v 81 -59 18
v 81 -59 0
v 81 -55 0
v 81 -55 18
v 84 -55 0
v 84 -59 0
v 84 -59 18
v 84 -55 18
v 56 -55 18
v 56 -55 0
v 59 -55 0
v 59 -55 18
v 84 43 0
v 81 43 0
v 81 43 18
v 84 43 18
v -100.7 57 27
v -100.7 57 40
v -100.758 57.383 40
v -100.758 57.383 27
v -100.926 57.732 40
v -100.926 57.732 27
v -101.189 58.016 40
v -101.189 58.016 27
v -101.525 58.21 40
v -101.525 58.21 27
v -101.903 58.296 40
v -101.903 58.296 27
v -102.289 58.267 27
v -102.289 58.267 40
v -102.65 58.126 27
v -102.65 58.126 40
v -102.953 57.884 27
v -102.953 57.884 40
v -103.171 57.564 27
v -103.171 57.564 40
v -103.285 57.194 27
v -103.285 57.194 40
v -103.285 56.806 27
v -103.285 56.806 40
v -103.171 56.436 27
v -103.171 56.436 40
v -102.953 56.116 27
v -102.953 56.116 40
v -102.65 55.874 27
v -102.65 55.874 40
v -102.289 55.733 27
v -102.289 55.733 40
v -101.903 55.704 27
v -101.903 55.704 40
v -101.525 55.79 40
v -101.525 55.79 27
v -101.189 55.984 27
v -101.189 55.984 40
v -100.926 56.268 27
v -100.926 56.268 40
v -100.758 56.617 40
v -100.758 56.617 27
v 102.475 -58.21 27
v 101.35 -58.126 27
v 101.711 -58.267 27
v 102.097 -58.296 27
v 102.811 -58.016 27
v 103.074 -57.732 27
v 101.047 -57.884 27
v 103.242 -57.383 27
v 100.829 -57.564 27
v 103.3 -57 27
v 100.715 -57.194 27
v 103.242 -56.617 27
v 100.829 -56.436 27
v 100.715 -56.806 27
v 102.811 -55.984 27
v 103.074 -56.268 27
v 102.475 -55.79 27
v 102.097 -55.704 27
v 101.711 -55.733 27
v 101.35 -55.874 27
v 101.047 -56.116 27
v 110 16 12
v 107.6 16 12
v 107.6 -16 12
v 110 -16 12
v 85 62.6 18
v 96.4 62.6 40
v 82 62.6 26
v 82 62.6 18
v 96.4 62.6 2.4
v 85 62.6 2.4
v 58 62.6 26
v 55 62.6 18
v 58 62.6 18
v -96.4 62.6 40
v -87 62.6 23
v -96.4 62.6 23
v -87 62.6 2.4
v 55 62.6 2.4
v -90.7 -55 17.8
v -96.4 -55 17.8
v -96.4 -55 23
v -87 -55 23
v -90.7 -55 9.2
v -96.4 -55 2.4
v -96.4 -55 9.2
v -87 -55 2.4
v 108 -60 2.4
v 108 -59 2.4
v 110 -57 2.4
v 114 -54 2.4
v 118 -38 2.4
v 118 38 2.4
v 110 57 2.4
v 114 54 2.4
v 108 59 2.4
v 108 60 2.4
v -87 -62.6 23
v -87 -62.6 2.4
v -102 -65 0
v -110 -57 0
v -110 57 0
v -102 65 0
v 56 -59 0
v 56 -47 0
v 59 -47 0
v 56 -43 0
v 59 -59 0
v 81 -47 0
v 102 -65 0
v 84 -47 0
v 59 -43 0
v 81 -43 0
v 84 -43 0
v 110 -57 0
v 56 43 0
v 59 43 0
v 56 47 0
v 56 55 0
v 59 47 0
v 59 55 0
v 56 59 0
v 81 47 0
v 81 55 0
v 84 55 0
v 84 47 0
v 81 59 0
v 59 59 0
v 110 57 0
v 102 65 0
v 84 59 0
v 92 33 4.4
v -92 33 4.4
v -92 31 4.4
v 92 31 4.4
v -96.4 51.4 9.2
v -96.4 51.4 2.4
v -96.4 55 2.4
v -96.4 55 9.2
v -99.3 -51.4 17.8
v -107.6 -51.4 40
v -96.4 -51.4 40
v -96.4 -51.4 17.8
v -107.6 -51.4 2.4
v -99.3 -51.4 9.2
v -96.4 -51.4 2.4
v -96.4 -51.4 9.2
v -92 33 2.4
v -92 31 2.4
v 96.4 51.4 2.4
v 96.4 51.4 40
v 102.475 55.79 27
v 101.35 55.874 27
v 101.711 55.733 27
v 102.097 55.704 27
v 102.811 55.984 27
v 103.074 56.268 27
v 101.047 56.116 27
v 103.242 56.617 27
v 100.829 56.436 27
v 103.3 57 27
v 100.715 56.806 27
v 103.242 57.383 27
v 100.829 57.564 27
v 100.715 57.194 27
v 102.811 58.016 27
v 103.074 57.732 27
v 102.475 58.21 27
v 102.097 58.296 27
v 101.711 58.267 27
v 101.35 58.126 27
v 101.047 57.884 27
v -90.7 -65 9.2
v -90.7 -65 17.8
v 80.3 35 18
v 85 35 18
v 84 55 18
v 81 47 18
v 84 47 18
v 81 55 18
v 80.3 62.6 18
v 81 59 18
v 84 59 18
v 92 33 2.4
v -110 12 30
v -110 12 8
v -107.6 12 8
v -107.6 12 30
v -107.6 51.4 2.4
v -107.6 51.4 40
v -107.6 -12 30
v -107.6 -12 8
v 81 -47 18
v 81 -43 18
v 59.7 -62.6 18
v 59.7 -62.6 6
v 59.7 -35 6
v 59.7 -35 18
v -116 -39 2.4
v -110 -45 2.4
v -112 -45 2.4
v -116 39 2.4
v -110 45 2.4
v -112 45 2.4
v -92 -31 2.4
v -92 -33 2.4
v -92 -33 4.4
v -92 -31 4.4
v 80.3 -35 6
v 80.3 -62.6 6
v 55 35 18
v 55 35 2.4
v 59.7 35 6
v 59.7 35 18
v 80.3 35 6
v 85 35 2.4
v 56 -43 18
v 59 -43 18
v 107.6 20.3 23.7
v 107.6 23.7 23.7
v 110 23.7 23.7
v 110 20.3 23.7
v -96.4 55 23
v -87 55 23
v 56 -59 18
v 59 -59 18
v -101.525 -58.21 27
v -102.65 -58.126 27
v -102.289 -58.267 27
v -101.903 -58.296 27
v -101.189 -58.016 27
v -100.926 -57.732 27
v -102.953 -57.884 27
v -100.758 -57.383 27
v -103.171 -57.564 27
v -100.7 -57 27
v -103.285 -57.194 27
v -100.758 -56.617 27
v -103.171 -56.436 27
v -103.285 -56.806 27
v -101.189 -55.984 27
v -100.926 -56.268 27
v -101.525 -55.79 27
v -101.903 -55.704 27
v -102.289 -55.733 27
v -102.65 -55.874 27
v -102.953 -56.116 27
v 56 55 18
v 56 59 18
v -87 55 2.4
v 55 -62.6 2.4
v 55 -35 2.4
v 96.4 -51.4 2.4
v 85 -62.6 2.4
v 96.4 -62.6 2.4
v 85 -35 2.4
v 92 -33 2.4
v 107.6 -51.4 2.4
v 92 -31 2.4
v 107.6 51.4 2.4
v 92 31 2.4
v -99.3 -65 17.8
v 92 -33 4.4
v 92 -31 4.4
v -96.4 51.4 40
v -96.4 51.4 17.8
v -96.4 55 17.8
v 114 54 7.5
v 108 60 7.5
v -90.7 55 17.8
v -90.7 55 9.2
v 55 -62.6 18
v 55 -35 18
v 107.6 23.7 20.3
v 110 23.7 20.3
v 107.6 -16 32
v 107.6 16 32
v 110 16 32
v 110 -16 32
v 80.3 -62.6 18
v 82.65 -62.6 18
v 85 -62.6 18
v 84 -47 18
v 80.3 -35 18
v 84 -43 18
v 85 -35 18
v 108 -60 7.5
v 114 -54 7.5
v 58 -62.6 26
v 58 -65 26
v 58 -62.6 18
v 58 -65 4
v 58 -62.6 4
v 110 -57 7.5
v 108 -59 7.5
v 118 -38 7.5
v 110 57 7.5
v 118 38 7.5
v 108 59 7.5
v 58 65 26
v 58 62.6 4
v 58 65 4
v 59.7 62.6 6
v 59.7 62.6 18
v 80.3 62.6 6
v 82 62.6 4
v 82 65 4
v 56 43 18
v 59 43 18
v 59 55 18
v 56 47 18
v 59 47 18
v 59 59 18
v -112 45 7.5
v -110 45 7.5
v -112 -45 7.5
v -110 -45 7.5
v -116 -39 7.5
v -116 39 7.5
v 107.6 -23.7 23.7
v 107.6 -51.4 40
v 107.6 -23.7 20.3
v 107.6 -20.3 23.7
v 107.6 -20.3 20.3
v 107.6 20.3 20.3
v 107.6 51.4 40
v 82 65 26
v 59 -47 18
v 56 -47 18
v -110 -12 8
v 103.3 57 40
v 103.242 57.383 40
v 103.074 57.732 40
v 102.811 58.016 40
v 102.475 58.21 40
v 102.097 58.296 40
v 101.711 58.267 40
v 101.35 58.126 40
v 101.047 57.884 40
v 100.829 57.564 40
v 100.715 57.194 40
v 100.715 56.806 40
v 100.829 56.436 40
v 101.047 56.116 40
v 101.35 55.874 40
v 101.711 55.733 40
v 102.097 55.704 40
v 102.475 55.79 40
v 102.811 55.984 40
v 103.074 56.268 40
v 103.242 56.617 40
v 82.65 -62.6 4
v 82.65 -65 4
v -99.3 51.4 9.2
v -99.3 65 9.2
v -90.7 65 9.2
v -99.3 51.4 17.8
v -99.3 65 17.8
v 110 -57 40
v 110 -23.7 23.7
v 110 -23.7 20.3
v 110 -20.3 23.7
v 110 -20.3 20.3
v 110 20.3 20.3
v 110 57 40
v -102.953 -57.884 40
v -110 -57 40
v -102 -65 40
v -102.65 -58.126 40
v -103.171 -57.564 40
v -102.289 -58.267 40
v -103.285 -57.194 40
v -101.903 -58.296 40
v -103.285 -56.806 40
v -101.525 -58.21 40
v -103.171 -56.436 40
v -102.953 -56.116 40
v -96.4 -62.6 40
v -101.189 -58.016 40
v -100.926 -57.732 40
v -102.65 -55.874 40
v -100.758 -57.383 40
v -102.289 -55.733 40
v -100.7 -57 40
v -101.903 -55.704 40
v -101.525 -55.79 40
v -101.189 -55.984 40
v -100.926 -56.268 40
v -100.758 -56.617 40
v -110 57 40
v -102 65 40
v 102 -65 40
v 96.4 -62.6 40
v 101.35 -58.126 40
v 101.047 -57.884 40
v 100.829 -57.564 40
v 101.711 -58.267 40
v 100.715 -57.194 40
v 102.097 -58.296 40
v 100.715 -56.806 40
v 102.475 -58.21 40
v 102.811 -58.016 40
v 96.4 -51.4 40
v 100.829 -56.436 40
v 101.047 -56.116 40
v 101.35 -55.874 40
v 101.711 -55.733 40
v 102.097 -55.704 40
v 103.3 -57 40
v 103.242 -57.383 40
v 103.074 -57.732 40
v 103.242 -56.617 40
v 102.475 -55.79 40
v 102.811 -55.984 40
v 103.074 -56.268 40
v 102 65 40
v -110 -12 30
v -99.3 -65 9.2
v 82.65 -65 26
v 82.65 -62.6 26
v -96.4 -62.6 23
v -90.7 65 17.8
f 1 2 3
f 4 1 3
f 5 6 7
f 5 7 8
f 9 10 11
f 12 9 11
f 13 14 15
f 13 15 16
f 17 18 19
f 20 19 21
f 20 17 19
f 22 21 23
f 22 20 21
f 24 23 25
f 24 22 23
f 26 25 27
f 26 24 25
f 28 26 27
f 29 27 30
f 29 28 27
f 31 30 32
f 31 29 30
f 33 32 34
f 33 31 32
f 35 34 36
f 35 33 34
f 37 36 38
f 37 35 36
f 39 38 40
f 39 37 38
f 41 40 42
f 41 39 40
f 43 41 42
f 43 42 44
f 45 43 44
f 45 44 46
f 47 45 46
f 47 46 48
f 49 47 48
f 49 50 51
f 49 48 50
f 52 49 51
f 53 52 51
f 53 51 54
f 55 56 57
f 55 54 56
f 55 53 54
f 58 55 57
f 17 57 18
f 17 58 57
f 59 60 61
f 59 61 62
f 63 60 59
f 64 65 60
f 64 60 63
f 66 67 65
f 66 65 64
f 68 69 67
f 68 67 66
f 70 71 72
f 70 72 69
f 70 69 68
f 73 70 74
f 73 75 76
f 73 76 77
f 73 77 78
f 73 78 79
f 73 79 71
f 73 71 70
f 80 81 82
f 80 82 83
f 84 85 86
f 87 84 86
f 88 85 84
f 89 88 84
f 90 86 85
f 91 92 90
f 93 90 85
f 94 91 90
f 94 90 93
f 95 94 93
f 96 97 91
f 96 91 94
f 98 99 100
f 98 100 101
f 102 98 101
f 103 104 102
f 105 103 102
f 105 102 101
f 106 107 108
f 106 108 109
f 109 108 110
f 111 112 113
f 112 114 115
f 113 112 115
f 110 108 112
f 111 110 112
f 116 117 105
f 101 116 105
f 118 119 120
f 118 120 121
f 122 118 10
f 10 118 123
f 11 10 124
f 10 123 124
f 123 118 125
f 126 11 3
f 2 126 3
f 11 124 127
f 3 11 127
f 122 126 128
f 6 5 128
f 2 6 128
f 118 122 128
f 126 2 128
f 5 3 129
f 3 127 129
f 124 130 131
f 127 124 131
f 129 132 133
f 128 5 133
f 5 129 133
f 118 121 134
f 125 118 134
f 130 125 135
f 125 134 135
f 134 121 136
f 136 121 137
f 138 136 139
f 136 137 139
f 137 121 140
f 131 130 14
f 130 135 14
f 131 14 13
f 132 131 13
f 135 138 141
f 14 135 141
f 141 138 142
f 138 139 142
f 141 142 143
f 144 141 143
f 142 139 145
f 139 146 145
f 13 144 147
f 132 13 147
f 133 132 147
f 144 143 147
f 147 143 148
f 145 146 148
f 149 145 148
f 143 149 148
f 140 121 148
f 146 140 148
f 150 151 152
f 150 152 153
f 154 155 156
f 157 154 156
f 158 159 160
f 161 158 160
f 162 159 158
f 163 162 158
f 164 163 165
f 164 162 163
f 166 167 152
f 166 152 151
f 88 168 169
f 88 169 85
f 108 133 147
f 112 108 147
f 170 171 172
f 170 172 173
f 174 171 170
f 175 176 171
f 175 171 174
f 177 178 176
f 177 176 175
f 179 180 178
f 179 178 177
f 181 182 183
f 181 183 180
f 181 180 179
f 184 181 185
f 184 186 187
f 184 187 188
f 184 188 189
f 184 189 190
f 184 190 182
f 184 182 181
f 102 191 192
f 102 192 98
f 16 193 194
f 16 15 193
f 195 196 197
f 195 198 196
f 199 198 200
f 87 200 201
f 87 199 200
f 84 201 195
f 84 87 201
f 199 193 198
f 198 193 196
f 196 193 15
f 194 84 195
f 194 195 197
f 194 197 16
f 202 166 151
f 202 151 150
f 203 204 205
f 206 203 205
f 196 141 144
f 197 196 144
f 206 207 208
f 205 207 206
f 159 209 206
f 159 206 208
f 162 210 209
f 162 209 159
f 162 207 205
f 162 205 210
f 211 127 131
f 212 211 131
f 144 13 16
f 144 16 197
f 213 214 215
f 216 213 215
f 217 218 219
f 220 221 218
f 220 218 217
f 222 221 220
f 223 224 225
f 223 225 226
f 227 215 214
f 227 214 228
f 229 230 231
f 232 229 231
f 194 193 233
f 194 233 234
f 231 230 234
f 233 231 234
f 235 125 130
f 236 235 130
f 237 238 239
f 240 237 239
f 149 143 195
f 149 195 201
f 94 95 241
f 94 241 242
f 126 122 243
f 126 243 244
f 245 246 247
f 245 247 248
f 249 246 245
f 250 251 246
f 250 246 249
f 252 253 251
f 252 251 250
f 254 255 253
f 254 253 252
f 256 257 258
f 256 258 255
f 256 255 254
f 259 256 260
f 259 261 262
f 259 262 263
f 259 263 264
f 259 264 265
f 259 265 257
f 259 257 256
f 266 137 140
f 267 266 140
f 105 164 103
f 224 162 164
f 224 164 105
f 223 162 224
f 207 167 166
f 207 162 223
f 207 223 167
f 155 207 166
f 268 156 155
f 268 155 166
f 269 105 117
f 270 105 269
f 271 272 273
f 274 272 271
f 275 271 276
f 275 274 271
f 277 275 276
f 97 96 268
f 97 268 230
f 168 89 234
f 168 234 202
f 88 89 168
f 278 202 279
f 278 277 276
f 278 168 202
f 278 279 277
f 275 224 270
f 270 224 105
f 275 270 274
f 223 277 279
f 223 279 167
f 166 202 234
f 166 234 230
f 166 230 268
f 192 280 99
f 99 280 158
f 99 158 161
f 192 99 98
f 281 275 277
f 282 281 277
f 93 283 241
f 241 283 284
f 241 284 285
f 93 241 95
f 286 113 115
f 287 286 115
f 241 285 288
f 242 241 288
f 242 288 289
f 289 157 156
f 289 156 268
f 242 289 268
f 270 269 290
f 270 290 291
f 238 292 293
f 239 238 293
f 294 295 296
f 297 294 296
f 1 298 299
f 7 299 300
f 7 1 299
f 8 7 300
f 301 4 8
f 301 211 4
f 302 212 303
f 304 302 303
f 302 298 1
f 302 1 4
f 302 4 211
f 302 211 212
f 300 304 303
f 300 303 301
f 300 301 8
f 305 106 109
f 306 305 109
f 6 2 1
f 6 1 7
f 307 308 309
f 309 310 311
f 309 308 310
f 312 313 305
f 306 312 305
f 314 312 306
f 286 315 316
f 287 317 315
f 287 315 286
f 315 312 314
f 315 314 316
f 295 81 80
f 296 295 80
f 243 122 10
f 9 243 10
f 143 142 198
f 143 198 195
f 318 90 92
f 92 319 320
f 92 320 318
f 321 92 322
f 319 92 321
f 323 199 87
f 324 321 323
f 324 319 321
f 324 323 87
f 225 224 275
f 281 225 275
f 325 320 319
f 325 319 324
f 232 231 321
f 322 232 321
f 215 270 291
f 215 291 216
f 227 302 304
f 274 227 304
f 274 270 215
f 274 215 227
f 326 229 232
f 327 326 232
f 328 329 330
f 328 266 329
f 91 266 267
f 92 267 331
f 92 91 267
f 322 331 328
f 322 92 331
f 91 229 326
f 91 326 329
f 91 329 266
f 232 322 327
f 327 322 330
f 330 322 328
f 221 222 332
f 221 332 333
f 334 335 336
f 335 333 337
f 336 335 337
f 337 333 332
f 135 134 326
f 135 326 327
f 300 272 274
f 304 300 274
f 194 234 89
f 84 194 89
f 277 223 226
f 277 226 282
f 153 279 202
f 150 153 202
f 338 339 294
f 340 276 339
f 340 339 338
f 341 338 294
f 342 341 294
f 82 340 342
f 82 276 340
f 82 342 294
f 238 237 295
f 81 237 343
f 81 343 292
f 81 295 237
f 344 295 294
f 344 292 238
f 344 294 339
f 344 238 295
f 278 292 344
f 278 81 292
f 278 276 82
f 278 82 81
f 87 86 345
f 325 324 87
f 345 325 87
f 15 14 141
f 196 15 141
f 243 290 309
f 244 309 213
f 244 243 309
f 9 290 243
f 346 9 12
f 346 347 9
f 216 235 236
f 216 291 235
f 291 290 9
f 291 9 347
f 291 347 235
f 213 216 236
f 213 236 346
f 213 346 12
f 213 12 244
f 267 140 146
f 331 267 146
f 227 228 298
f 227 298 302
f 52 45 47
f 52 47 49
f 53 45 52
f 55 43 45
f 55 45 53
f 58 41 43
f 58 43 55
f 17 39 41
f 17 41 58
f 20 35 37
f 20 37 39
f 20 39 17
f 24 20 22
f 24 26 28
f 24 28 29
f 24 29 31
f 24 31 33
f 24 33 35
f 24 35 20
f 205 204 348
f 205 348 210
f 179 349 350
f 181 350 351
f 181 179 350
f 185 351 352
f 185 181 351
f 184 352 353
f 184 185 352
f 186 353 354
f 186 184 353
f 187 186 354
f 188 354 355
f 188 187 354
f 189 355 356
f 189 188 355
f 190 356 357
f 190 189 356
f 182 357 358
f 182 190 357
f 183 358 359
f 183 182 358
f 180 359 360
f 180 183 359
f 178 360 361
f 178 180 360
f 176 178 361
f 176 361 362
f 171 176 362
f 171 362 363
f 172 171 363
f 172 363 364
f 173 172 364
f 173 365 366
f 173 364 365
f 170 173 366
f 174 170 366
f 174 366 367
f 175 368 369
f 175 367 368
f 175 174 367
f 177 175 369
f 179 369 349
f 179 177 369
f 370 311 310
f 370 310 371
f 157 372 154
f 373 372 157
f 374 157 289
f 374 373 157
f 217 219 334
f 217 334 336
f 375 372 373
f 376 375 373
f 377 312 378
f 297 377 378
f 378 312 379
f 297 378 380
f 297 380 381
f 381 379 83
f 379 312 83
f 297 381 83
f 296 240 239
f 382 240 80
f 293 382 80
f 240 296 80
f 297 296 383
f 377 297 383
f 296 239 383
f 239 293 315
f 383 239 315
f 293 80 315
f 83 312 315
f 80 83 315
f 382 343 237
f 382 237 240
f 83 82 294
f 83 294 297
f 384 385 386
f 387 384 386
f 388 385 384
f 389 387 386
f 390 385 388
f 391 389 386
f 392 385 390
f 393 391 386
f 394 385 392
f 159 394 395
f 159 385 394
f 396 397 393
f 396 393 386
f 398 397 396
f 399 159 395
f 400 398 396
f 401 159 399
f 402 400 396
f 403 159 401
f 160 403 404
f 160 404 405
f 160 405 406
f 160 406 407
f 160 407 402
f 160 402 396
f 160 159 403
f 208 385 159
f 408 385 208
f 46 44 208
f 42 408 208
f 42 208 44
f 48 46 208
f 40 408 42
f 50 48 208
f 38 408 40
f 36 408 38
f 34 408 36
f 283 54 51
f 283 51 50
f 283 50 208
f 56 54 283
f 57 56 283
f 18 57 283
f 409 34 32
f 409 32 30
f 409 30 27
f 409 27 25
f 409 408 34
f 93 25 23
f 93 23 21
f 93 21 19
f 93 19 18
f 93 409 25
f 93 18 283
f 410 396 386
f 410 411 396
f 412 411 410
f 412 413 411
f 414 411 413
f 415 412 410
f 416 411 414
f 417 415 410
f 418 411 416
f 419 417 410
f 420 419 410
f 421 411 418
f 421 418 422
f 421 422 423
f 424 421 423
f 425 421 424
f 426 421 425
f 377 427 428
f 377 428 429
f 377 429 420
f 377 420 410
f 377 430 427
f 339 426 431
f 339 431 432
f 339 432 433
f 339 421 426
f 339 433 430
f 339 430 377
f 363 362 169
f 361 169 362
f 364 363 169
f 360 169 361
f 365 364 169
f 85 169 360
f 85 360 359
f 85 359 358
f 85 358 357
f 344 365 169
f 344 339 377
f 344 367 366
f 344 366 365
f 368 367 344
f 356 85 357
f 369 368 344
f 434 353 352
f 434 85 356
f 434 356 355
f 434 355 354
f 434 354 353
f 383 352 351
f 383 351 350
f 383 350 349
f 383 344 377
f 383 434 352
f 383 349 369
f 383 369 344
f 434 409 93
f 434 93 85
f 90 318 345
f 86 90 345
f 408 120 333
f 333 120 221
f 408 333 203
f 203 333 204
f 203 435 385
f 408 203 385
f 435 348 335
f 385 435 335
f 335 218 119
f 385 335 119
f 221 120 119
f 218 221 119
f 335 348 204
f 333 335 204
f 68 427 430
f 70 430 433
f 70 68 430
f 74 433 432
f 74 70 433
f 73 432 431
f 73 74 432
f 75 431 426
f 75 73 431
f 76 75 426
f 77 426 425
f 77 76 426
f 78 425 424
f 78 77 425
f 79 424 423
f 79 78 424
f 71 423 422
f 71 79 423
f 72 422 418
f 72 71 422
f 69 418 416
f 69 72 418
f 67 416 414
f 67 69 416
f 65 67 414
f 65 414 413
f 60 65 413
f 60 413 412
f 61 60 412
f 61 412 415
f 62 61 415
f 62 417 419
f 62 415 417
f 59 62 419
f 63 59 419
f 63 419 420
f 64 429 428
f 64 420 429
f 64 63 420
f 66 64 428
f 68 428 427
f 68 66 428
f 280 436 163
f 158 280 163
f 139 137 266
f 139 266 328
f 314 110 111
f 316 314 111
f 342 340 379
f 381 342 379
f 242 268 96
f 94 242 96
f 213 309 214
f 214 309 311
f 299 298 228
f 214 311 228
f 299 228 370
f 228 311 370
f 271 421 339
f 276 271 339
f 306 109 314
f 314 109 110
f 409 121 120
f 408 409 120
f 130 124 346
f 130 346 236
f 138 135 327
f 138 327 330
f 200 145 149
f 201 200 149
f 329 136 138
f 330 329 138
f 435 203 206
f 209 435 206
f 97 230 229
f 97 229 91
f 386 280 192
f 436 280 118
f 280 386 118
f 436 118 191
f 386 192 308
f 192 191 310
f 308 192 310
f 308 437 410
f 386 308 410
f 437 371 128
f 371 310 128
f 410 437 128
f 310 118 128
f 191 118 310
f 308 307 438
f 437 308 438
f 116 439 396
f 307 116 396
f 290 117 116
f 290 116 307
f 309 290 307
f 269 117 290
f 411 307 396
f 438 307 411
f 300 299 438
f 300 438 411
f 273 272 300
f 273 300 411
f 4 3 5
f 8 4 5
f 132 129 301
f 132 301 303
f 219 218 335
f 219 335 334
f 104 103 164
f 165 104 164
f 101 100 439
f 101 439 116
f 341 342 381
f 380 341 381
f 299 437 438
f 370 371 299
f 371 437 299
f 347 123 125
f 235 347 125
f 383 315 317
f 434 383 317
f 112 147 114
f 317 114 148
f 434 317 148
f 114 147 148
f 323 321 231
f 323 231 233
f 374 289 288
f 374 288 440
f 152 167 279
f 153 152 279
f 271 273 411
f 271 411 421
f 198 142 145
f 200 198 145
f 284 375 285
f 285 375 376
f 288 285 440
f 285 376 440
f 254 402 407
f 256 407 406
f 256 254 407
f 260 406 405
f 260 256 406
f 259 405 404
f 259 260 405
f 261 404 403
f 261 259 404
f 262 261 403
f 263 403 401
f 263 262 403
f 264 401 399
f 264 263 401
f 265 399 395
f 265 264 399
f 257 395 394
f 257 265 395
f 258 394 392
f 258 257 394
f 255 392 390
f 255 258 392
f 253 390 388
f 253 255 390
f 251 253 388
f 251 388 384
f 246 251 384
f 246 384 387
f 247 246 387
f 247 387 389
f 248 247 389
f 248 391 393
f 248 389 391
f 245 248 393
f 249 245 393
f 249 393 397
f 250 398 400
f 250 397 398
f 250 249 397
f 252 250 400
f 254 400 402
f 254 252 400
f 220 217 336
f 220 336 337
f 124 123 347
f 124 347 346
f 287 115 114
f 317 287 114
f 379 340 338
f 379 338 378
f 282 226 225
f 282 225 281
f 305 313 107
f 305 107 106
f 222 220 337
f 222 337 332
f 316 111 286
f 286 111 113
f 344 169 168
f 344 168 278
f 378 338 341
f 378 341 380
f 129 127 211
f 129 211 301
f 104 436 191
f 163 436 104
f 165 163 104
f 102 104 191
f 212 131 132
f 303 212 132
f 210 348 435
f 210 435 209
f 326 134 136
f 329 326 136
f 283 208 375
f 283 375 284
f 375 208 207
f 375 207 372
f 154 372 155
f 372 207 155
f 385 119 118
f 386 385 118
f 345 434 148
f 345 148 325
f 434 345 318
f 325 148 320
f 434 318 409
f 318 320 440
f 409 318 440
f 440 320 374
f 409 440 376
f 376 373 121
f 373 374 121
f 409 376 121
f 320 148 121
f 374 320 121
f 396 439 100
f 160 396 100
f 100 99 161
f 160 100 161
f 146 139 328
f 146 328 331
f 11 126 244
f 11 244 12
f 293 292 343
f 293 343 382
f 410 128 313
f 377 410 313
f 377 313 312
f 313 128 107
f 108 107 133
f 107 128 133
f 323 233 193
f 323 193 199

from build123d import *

# Parameters (mm, degrees)
FACETED_FLOOR_220X130_DEPTH             = 2.4
FACETED_HOLLOW_WALLS_2P4_START          = 2.4
FACETED_HOLLOW_WALLS_2P4_DEPTH          = 37.6
LID_POST_1_1_START                      = 2.4
SKETCH3_W                               = 11.2
SKETCH3_H                               = 11.2
LID_POST_1_1_DEPTH                      = 37.6
M3_PILOT_1_1_START                      = 27
SKETCH4_R                               = 1.3
M3_PILOT_1_1_DEPTH                      = 14
SKETCH5_W                               = 11.2
SKETCH5_H                               = 11.2
LID_POST_1_1_2_DEPTH                    = 37.6
SKETCH6_R                               = 1.3
M3_PILOT_1_1_2_DEPTH                    = 14
SKETCH7_W                               = 11.2
SKETCH7_H                               = 11.2
LID_POST_1_1_3_DEPTH                    = 37.6
SKETCH8_R                               = 1.3
M3_PILOT_1_1_3_DEPTH                    = 14
SKETCH9_W                               = 11.2
SKETCH9_H                               = 11.2
LID_POST_1_1_4_DEPTH                    = 37.6
SKETCH10_R                              = 1.3
M3_PILOT_1_1_4_DEPTH                    = 14
MOTOR_SADDLE_BASE_1_START               = 2.4
SKETCH11_W                              = 30
SKETCH11_H                              = 30
MOTOR_SADDLE_BASE_1_DEPTH               = 3.6
MOTOR_GUIDE_A_1_START                   = 6
SKETCH12_W                              = 4.7
SKETCH12_H                              = 30
MOTOR_GUIDE_A_1_DEPTH                   = 12
MOTOR_GUIDE_B_1_START                   = 6
SKETCH13_W                              = 4.7
SKETCH13_H                              = 30
MOTOR_GUIDE_B_1_DEPTH                   = 12
TIESLOT_1_56_43_START                   = -0.1
SKETCH14_W                              = 3
SKETCH14_H                              = 4
TIESLOT_1_56_43_DEPTH                   = 19
TIESLOT_1_81_43_START                   = -0.1
SKETCH15_W                              = 3
SKETCH15_H                              = 4
TIESLOT_1_81_43_DEPTH                   = 19
TIESLOT_1_56_55_START                   = -0.1
SKETCH16_W                              = 3
SKETCH16_H                              = 4
TIESLOT_1_56_55_DEPTH                   = 19
TIESLOT_1_81_55_START                   = -0.1
SKETCH17_W                              = 3
SKETCH17_H                              = 4
TIESLOT_1_81_55_DEPTH                   = 19
MOTOR_SIDE_WINDOW_1_START               = 4
SKETCH18_W                              = 24.65
SKETCH18_H                              = 3.4
MOTOR_SIDE_WINDOW_1_DEPTH               = 22
REAR_AXLE_SUPPORT_1_START               = 2.4
SKETCH19_W                              = 16
SKETCH19_H                              = 10
REAR_AXLE_SUPPORT_1_DEPTH               = 20.6
REAR_PRINTED_AXLE_CLEARANCE_8P6_1_START = 9.2
SKETCH20_W                              = 8.6
SKETCH20_H                              = 15
REAR_PRINTED_AXLE_CLEARANCE_8P6_1_DEPTH = 8.6
SKETCH21_W                              = 30
SKETCH21_H                              = 30
MOTOR_SADDLE_BASE_1_2_DEPTH             = 3.6
SKETCH22_W                              = 4.7
SKETCH22_H                              = 30
MOTOR_GUIDE_A_1_2_DEPTH                 = 12
SKETCH23_W                              = 4.7
SKETCH23_H                              = 30
MOTOR_GUIDE_B_1_2_DEPTH                 = 12
SKETCH24_W                              = 3
SKETCH24_H                              = 4
TIESLOT_1_56_43_2_DEPTH                 = 19
SKETCH25_W                              = 3
SKETCH25_H                              = 4
TIESLOT_1_81_43_2_DEPTH                 = 19
SKETCH26_W                              = 3
SKETCH26_H                              = 4
TIESLOT_1_56_55_2_DEPTH                 = 19
SKETCH27_W                              = 3
SKETCH27_H                              = 4
TIESLOT_1_81_55_2_DEPTH                 = 19
SKETCH28_W                              = 24
SKETCH28_H                              = 3.4
MOTOR_SIDE_WINDOW_1_2_DEPTH             = 22
SKETCH29_W                              = 16
SKETCH29_H                              = 10
REAR_AXLE_SUPPORT_1_2_DEPTH             = 20.6
REAR_PRINTED_AXLE_CLEARANCE_8P61_START  = 9.2
SKETCH30_W                              = 8.6
SKETCH30_H                              = 14.6
REAR_PRINTED_AXLE_CLEARANCE_8P61_DEPTH  = 8.6
REAR_USB_ACCESS_24X22_START             = 8
SKETCH31_W                              = 3.4
SKETCH31_H                              = 24
REAR_USB_ACCESS_24X22_DEPTH             = 22
FRONT_TOF_WINDOW_32X20_START            = 12
SKETCH32_W                              = 3.4
SKETCH32_H                              = 32
FRONT_TOF_WINDOW_32X20_DEPTH            = 20
TOF_M3_CLEARANCE_1_START                = 20.3
SKETCH33_W                              = 3.4
SKETCH33_H                              = 3.4
TOF_M3_CLEARANCE_1_DEPTH                = 3.4
SKETCH34_W                              = 3.4
SKETCH34_H                              = 3.4
TOF_M3_CLEARANCE_1_2_DEPTH              = 3.4
BREADBOARD_LEFT_GUIDE_START             = 2.4
SKETCH35_W                              = 184
SKETCH35_H                              = 2
BREADBOARD_LEFT_GUIDE_DEPTH             = 2
BREADBOARD_RIGHT_GUIDE_START            = 2.4
SKETCH36_W                              = 184
SKETCH36_H                              = 2
BREADBOARD_RIGHT_GUIDE_DEPTH            = 2
OUTER_CORNER_TRIM_1_1_START             = 0.1
OUTER_CORNER_TRIM_1_1_DEPTH             = 40.2
OUTER_CORNER_TRIM_1_1_2_DEPTH           = 40.2
OUTER_CORNER_TRIM_1_1_3_DEPTH           = 40.2
OUTER_CORNER_TRIM_1_1_4_DEPTH           = 40.2
ANGLED_FRONT_BUMPER_START               = 2.4
ANGLED_FRONT_BUMPER_DEPTH               = 5.1
ANGLED_REAR_BUMPER_START                = 2.4
ANGLED_REAR_BUMPER_DEPTH                = 5.1


with BuildPart() as part:
    # Sketch1 → Faceted_Floor_220x130 (new body)
    with BuildSketch(Plane.XY):
        Polygon((-102, -65), (102, -65), (110, -57), (110, 57), (102, 65), (-102, 65), (-110, 57), (-110, -57), align=None)
    extrude(amount=FACETED_FLOOR_220X130_DEPTH)

    # Sketch2 → Faceted_Hollow_Walls_2p4 (add)
    with BuildSketch(Plane.XY.offset(FACETED_HOLLOW_WALLS_2P4_START)):
        Polygon((-102, -65), (102, -65), (110, -57), (110, 57), (102, 65), (-102, 65), (-110, 57), (-110, -57), align=None)
        Polygon((-102, -62.6), (102, -62.6), (107.6, -57), (107.6, 57), (102, 62.6), (-102, 62.6), (-107.6, 57), (-107.6, -57), align=None, mode=Mode.SUBTRACT)
    extrude(amount=FACETED_HOLLOW_WALLS_2P4_DEPTH)

    # Sketch3 → Lid_Post_-1_-1 (add)
    with BuildSketch(Plane.XY.offset(LID_POST_1_1_START)):
        with Locations((-102, -57)):
            Rectangle(SKETCH3_W, SKETCH3_H)
    extrude(amount=LID_POST_1_1_DEPTH)

    # Sketch4 → M3_Pilot_-1_-1 (cut)
    with BuildSketch(Plane.XY.offset(M3_PILOT_1_1_START)):
        with Locations((-102, -57)):
            Circle(SKETCH4_R)
    extrude(amount=M3_PILOT_1_1_DEPTH, mode=Mode.SUBTRACT)

    # Sketch5 → Lid_Post_-1_1 2 (add)
    with BuildSketch(Plane.XY.offset(LID_POST_1_1_START)):
        with Locations((-102, 57)):
            Rectangle(SKETCH5_W, SKETCH5_H)
    extrude(amount=LID_POST_1_1_2_DEPTH)

    # Sketch6 → M3_Pilot_-1_1 2 (cut)
    with BuildSketch(Plane.XY.offset(M3_PILOT_1_1_START)):
        with Locations((-102, 57)):
            Circle(SKETCH6_R)
    extrude(amount=M3_PILOT_1_1_2_DEPTH, mode=Mode.SUBTRACT)

    # Sketch7 → Lid_Post_1_-1 3 (add)
    with BuildSketch(Plane.XY.offset(LID_POST_1_1_START)):
        with Locations((102, -57)):
            Rectangle(SKETCH7_W, SKETCH7_H)
    extrude(amount=LID_POST_1_1_3_DEPTH)

    # Sketch8 → M3_Pilot_1_-1 3 (cut)
    with BuildSketch(Plane.XY.offset(M3_PILOT_1_1_START)):
        with Locations((102, -57)):
            Circle(SKETCH8_R)
    extrude(amount=M3_PILOT_1_1_3_DEPTH, mode=Mode.SUBTRACT)

    # Sketch9 → Lid_Post_1_1 4 (add)
    with BuildSketch(Plane.XY.offset(LID_POST_1_1_START)):
        with Locations((102, 57)):
            Rectangle(SKETCH9_W, SKETCH9_H)
    extrude(amount=LID_POST_1_1_4_DEPTH)

    # Sketch10 → M3_Pilot_1_1 4 (cut)
    with BuildSketch(Plane.XY.offset(M3_PILOT_1_1_START)):
        with Locations((102, 57)):
            Circle(SKETCH10_R)
    extrude(amount=M3_PILOT_1_1_4_DEPTH, mode=Mode.SUBTRACT)

    # Sketch11 → Motor_Saddle_Base_-1 (add)
    with BuildSketch(Plane.XY.offset(MOTOR_SADDLE_BASE_1_START)):
        with Locations((70, -50)):
            Rectangle(SKETCH11_W, SKETCH11_H)
    extrude(amount=MOTOR_SADDLE_BASE_1_DEPTH)

    # Sketch12 → Motor_Guide_A_-1 (add)
    with BuildSketch(Plane.XY.offset(MOTOR_GUIDE_A_1_START)):
        with Locations((57.35, -50)):
            Rectangle(SKETCH12_W, SKETCH12_H)
    extrude(amount=MOTOR_GUIDE_A_1_DEPTH)

    # Sketch13 → Motor_Guide_B_-1 (add)
    with BuildSketch(Plane.XY.offset(MOTOR_GUIDE_B_1_START)):
        with Locations((82.65, -50)):
            Rectangle(SKETCH13_W, SKETCH13_H)
    extrude(amount=MOTOR_GUIDE_B_1_DEPTH)

    # Sketch14 → TieSlot_-1_56_43 (cut)
    with BuildSketch(Plane.XY.offset(TIESLOT_1_56_43_START)):
        with Locations((57.5, -45)):
            Rectangle(SKETCH14_W, SKETCH14_H)
    extrude(amount=TIESLOT_1_56_43_DEPTH, mode=Mode.SUBTRACT)

    # Sketch15 → TieSlot_-1_81_43 (cut)
    with BuildSketch(Plane.XY.offset(TIESLOT_1_81_43_START)):
        with Locations((82.5, -45)):
            Rectangle(SKETCH15_W, SKETCH15_H)
    extrude(amount=TIESLOT_1_81_43_DEPTH, mode=Mode.SUBTRACT)

    # Sketch16 → TieSlot_-1_56_55 (cut)
    with BuildSketch(Plane.XY.offset(TIESLOT_1_56_55_START)):
        with Locations((57.5, -57)):
            Rectangle(SKETCH16_W, SKETCH16_H)
    extrude(amount=TIESLOT_1_56_55_DEPTH, mode=Mode.SUBTRACT)

    # Sketch17 → TieSlot_-1_81_55 (cut)
    with BuildSketch(Plane.XY.offset(TIESLOT_1_81_55_START)):
        with Locations((82.5, -57)):
            Rectangle(SKETCH17_W, SKETCH17_H)
    extrude(amount=TIESLOT_1_81_55_DEPTH, mode=Mode.SUBTRACT)

    # Sketch18 → Motor_Side_Window_-1 (cut)
    with BuildSketch(Plane.XY.offset(MOTOR_SIDE_WINDOW_1_START)):
        with Locations((70.325, -64.3)):
            Rectangle(SKETCH18_W, SKETCH18_H)
    extrude(amount=MOTOR_SIDE_WINDOW_1_DEPTH, mode=Mode.SUBTRACT)

    # Sketch19 → Rear_Axle_Support_-1 (add)
    with BuildSketch(Plane.XY.offset(REAR_AXLE_SUPPORT_1_START)):
        with Locations((-95, -60)):
            Rectangle(SKETCH19_W, SKETCH19_H)
    extrude(amount=REAR_AXLE_SUPPORT_1_DEPTH)

    # Sketch20 → Rear_Printed_Axle_Clearance_8p6-1 (cut)
    with BuildSketch(Plane.XY.offset(REAR_PRINTED_AXLE_CLEARANCE_8P6_1_START)):
        with Locations((-95, -58.5)):
            Rectangle(SKETCH20_W, SKETCH20_H)
    extrude(amount=REAR_PRINTED_AXLE_CLEARANCE_8P6_1_DEPTH, mode=Mode.SUBTRACT)

    # Sketch21 → Motor_Saddle_Base_1 2 (add)
    with BuildSketch(Plane.XY.offset(MOTOR_SADDLE_BASE_1_START)):
        with Locations((70, 50)):
            Rectangle(SKETCH21_W, SKETCH21_H)
    extrude(amount=MOTOR_SADDLE_BASE_1_2_DEPTH)

    # Sketch22 → Motor_Guide_A_1 2 (add)
    with BuildSketch(Plane.XY.offset(MOTOR_GUIDE_A_1_START)):
        with Locations((57.35, 50)):
            Rectangle(SKETCH22_W, SKETCH22_H)
    extrude(amount=MOTOR_GUIDE_A_1_2_DEPTH)

    # Sketch23 → Motor_Guide_B_1 2 (add)
    with BuildSketch(Plane.XY.offset(MOTOR_GUIDE_B_1_START)):
        with Locations((82.65, 50)):
            Rectangle(SKETCH23_W, SKETCH23_H)
    extrude(amount=MOTOR_GUIDE_B_1_2_DEPTH)

    # Sketch24 → TieSlot_1_56_43 2 (cut)
    with BuildSketch(Plane.XY.offset(TIESLOT_1_56_43_START)):
        with Locations((57.5, 45)):
            Rectangle(SKETCH24_W, SKETCH24_H)
    extrude(amount=TIESLOT_1_56_43_2_DEPTH, mode=Mode.SUBTRACT)

    # Sketch25 → TieSlot_1_81_43 2 (cut)
    with BuildSketch(Plane.XY.offset(TIESLOT_1_81_43_START)):
        with Locations((82.5, 45)):
            Rectangle(SKETCH25_W, SKETCH25_H)
    extrude(amount=TIESLOT_1_81_43_2_DEPTH, mode=Mode.SUBTRACT)

    # Sketch26 → TieSlot_1_56_55 2 (cut)
    with BuildSketch(Plane.XY.offset(TIESLOT_1_56_55_START)):
        with Locations((57.5, 57)):
            Rectangle(SKETCH26_W, SKETCH26_H)
    extrude(amount=TIESLOT_1_56_55_2_DEPTH, mode=Mode.SUBTRACT)

    # Sketch27 → TieSlot_1_81_55 2 (cut)
    with BuildSketch(Plane.XY.offset(TIESLOT_1_81_55_START)):
        with Locations((82.5, 57)):
            Rectangle(SKETCH27_W, SKETCH27_H)
    extrude(amount=TIESLOT_1_81_55_2_DEPTH, mode=Mode.SUBTRACT)

    # Sketch28 → Motor_Side_Window_1 2 (cut)
    with BuildSketch(Plane.XY.offset(MOTOR_SIDE_WINDOW_1_START)):
        with Locations((70, 64.3)):
            Rectangle(SKETCH28_W, SKETCH28_H)
    extrude(amount=MOTOR_SIDE_WINDOW_1_2_DEPTH, mode=Mode.SUBTRACT)

    # Sketch29 → Rear_Axle_Support_1 2 (add)
    with BuildSketch(Plane.XY.offset(REAR_AXLE_SUPPORT_1_START)):
        with Locations((-95, 60)):
            Rectangle(SKETCH29_W, SKETCH29_H)
    extrude(amount=REAR_AXLE_SUPPORT_1_2_DEPTH)

    # Sketch30 → Rear_Printed_Axle_Clearance_8p61 (cut)
    with BuildSketch(Plane.XY.offset(REAR_PRINTED_AXLE_CLEARANCE_8P61_START)):
        with Locations((-95, 58.7)):
            Rectangle(SKETCH30_W, SKETCH30_H)
    extrude(amount=REAR_PRINTED_AXLE_CLEARANCE_8P61_DEPTH, mode=Mode.SUBTRACT)

    # Sketch31 → Rear_USB_Access_24x22 (cut)
    with BuildSketch(Plane.XY.offset(REAR_USB_ACCESS_24X22_START)):
        with Locations((-109.3, 0)):
            Rectangle(SKETCH31_W, SKETCH31_H)
    extrude(amount=REAR_USB_ACCESS_24X22_DEPTH, mode=Mode.SUBTRACT)

    # Sketch32 → Front_ToF_Window_32x20 (cut)
    with BuildSketch(Plane.XY.offset(FRONT_TOF_WINDOW_32X20_START)):
        with Locations((109.3, 0)):
            Rectangle(SKETCH32_W, SKETCH32_H)
    extrude(amount=FRONT_TOF_WINDOW_32X20_DEPTH, mode=Mode.SUBTRACT)

    # Sketch33 → ToF_M3_Clearance_-1 (cut)
    with BuildSketch(Plane.XY.offset(TOF_M3_CLEARANCE_1_START)):
        with Locations((109.3, -22)):
            Rectangle(SKETCH33_W, SKETCH33_H)
    extrude(amount=TOF_M3_CLEARANCE_1_DEPTH, mode=Mode.SUBTRACT)

    # Sketch34 → ToF_M3_Clearance_1 2 (cut)
    with BuildSketch(Plane.XY.offset(TOF_M3_CLEARANCE_1_START)):
        with Locations((109.3, 22)):
            Rectangle(SKETCH34_W, SKETCH34_H)
    extrude(amount=TOF_M3_CLEARANCE_1_2_DEPTH, mode=Mode.SUBTRACT)

    # Sketch35 → Breadboard_Left_Guide (add)
    with BuildSketch(Plane.XY.offset(BREADBOARD_LEFT_GUIDE_START)):
        with Locations((0, -32)):
            Rectangle(SKETCH35_W, SKETCH35_H)
    extrude(amount=BREADBOARD_LEFT_GUIDE_DEPTH)

    # Sketch36 → Breadboard_Right_Guide (add)
    with BuildSketch(Plane.XY.offset(BREADBOARD_RIGHT_GUIDE_START)):
        with Locations((0, 32)):
            Rectangle(SKETCH36_W, SKETCH36_H)
    extrude(amount=BREADBOARD_RIGHT_GUIDE_DEPTH)

    # Sketch37 → Outer_Corner_Trim_-1_-1 (cut)
    with BuildSketch(Plane.XY.offset(OUTER_CORNER_TRIM_1_1_START)):
        Polygon((-102, -65), (-110, -57), (-110, -65), align=None)
    extrude(amount=OUTER_CORNER_TRIM_1_1_DEPTH, mode=Mode.SUBTRACT)

    # Sketch38 → Outer_Corner_Trim_-1_1 2 (cut)
    with BuildSketch(Plane.XY.offset(OUTER_CORNER_TRIM_1_1_START)):
        Polygon((-102, 65), (-110, 57), (-110, 65), align=None)
    extrude(amount=OUTER_CORNER_TRIM_1_1_2_DEPTH, mode=Mode.SUBTRACT)

    # Sketch39 → Outer_Corner_Trim_1_-1 3 (cut)
    with BuildSketch(Plane.XY.offset(OUTER_CORNER_TRIM_1_1_START)):
        Polygon((102, -65), (110, -57), (110, -65), align=None)
    extrude(amount=OUTER_CORNER_TRIM_1_1_3_DEPTH, mode=Mode.SUBTRACT)

    # Sketch40 → Outer_Corner_Trim_1_1 4 (cut)
    with BuildSketch(Plane.XY.offset(OUTER_CORNER_TRIM_1_1_START)):
        Polygon((102, 65), (110, 57), (110, 65), align=None)
    extrude(amount=OUTER_CORNER_TRIM_1_1_4_DEPTH, mode=Mode.SUBTRACT)

    # Sketch41 → Angled_Front_Bumper (add)
    with BuildSketch(Plane.XY.offset(ANGLED_FRONT_BUMPER_START)):
        Polygon((108, -60), (114, -54), (118, -38), (118, 38), (114, 54), (108, 60), align=None)
    extrude(amount=ANGLED_FRONT_BUMPER_DEPTH)

    # Sketch42 → Angled_Rear_Bumper (add)
    with BuildSketch(Plane.XY.offset(ANGLED_REAR_BUMPER_START)):
        Polygon((-107.6, -45), (-112, -45), (-116, -39), (-116, 39), (-112, 45), (-107.6, 45), align=None)
    extrude(amount=ANGLED_REAR_BUMPER_DEPTH)


solid = part.part
